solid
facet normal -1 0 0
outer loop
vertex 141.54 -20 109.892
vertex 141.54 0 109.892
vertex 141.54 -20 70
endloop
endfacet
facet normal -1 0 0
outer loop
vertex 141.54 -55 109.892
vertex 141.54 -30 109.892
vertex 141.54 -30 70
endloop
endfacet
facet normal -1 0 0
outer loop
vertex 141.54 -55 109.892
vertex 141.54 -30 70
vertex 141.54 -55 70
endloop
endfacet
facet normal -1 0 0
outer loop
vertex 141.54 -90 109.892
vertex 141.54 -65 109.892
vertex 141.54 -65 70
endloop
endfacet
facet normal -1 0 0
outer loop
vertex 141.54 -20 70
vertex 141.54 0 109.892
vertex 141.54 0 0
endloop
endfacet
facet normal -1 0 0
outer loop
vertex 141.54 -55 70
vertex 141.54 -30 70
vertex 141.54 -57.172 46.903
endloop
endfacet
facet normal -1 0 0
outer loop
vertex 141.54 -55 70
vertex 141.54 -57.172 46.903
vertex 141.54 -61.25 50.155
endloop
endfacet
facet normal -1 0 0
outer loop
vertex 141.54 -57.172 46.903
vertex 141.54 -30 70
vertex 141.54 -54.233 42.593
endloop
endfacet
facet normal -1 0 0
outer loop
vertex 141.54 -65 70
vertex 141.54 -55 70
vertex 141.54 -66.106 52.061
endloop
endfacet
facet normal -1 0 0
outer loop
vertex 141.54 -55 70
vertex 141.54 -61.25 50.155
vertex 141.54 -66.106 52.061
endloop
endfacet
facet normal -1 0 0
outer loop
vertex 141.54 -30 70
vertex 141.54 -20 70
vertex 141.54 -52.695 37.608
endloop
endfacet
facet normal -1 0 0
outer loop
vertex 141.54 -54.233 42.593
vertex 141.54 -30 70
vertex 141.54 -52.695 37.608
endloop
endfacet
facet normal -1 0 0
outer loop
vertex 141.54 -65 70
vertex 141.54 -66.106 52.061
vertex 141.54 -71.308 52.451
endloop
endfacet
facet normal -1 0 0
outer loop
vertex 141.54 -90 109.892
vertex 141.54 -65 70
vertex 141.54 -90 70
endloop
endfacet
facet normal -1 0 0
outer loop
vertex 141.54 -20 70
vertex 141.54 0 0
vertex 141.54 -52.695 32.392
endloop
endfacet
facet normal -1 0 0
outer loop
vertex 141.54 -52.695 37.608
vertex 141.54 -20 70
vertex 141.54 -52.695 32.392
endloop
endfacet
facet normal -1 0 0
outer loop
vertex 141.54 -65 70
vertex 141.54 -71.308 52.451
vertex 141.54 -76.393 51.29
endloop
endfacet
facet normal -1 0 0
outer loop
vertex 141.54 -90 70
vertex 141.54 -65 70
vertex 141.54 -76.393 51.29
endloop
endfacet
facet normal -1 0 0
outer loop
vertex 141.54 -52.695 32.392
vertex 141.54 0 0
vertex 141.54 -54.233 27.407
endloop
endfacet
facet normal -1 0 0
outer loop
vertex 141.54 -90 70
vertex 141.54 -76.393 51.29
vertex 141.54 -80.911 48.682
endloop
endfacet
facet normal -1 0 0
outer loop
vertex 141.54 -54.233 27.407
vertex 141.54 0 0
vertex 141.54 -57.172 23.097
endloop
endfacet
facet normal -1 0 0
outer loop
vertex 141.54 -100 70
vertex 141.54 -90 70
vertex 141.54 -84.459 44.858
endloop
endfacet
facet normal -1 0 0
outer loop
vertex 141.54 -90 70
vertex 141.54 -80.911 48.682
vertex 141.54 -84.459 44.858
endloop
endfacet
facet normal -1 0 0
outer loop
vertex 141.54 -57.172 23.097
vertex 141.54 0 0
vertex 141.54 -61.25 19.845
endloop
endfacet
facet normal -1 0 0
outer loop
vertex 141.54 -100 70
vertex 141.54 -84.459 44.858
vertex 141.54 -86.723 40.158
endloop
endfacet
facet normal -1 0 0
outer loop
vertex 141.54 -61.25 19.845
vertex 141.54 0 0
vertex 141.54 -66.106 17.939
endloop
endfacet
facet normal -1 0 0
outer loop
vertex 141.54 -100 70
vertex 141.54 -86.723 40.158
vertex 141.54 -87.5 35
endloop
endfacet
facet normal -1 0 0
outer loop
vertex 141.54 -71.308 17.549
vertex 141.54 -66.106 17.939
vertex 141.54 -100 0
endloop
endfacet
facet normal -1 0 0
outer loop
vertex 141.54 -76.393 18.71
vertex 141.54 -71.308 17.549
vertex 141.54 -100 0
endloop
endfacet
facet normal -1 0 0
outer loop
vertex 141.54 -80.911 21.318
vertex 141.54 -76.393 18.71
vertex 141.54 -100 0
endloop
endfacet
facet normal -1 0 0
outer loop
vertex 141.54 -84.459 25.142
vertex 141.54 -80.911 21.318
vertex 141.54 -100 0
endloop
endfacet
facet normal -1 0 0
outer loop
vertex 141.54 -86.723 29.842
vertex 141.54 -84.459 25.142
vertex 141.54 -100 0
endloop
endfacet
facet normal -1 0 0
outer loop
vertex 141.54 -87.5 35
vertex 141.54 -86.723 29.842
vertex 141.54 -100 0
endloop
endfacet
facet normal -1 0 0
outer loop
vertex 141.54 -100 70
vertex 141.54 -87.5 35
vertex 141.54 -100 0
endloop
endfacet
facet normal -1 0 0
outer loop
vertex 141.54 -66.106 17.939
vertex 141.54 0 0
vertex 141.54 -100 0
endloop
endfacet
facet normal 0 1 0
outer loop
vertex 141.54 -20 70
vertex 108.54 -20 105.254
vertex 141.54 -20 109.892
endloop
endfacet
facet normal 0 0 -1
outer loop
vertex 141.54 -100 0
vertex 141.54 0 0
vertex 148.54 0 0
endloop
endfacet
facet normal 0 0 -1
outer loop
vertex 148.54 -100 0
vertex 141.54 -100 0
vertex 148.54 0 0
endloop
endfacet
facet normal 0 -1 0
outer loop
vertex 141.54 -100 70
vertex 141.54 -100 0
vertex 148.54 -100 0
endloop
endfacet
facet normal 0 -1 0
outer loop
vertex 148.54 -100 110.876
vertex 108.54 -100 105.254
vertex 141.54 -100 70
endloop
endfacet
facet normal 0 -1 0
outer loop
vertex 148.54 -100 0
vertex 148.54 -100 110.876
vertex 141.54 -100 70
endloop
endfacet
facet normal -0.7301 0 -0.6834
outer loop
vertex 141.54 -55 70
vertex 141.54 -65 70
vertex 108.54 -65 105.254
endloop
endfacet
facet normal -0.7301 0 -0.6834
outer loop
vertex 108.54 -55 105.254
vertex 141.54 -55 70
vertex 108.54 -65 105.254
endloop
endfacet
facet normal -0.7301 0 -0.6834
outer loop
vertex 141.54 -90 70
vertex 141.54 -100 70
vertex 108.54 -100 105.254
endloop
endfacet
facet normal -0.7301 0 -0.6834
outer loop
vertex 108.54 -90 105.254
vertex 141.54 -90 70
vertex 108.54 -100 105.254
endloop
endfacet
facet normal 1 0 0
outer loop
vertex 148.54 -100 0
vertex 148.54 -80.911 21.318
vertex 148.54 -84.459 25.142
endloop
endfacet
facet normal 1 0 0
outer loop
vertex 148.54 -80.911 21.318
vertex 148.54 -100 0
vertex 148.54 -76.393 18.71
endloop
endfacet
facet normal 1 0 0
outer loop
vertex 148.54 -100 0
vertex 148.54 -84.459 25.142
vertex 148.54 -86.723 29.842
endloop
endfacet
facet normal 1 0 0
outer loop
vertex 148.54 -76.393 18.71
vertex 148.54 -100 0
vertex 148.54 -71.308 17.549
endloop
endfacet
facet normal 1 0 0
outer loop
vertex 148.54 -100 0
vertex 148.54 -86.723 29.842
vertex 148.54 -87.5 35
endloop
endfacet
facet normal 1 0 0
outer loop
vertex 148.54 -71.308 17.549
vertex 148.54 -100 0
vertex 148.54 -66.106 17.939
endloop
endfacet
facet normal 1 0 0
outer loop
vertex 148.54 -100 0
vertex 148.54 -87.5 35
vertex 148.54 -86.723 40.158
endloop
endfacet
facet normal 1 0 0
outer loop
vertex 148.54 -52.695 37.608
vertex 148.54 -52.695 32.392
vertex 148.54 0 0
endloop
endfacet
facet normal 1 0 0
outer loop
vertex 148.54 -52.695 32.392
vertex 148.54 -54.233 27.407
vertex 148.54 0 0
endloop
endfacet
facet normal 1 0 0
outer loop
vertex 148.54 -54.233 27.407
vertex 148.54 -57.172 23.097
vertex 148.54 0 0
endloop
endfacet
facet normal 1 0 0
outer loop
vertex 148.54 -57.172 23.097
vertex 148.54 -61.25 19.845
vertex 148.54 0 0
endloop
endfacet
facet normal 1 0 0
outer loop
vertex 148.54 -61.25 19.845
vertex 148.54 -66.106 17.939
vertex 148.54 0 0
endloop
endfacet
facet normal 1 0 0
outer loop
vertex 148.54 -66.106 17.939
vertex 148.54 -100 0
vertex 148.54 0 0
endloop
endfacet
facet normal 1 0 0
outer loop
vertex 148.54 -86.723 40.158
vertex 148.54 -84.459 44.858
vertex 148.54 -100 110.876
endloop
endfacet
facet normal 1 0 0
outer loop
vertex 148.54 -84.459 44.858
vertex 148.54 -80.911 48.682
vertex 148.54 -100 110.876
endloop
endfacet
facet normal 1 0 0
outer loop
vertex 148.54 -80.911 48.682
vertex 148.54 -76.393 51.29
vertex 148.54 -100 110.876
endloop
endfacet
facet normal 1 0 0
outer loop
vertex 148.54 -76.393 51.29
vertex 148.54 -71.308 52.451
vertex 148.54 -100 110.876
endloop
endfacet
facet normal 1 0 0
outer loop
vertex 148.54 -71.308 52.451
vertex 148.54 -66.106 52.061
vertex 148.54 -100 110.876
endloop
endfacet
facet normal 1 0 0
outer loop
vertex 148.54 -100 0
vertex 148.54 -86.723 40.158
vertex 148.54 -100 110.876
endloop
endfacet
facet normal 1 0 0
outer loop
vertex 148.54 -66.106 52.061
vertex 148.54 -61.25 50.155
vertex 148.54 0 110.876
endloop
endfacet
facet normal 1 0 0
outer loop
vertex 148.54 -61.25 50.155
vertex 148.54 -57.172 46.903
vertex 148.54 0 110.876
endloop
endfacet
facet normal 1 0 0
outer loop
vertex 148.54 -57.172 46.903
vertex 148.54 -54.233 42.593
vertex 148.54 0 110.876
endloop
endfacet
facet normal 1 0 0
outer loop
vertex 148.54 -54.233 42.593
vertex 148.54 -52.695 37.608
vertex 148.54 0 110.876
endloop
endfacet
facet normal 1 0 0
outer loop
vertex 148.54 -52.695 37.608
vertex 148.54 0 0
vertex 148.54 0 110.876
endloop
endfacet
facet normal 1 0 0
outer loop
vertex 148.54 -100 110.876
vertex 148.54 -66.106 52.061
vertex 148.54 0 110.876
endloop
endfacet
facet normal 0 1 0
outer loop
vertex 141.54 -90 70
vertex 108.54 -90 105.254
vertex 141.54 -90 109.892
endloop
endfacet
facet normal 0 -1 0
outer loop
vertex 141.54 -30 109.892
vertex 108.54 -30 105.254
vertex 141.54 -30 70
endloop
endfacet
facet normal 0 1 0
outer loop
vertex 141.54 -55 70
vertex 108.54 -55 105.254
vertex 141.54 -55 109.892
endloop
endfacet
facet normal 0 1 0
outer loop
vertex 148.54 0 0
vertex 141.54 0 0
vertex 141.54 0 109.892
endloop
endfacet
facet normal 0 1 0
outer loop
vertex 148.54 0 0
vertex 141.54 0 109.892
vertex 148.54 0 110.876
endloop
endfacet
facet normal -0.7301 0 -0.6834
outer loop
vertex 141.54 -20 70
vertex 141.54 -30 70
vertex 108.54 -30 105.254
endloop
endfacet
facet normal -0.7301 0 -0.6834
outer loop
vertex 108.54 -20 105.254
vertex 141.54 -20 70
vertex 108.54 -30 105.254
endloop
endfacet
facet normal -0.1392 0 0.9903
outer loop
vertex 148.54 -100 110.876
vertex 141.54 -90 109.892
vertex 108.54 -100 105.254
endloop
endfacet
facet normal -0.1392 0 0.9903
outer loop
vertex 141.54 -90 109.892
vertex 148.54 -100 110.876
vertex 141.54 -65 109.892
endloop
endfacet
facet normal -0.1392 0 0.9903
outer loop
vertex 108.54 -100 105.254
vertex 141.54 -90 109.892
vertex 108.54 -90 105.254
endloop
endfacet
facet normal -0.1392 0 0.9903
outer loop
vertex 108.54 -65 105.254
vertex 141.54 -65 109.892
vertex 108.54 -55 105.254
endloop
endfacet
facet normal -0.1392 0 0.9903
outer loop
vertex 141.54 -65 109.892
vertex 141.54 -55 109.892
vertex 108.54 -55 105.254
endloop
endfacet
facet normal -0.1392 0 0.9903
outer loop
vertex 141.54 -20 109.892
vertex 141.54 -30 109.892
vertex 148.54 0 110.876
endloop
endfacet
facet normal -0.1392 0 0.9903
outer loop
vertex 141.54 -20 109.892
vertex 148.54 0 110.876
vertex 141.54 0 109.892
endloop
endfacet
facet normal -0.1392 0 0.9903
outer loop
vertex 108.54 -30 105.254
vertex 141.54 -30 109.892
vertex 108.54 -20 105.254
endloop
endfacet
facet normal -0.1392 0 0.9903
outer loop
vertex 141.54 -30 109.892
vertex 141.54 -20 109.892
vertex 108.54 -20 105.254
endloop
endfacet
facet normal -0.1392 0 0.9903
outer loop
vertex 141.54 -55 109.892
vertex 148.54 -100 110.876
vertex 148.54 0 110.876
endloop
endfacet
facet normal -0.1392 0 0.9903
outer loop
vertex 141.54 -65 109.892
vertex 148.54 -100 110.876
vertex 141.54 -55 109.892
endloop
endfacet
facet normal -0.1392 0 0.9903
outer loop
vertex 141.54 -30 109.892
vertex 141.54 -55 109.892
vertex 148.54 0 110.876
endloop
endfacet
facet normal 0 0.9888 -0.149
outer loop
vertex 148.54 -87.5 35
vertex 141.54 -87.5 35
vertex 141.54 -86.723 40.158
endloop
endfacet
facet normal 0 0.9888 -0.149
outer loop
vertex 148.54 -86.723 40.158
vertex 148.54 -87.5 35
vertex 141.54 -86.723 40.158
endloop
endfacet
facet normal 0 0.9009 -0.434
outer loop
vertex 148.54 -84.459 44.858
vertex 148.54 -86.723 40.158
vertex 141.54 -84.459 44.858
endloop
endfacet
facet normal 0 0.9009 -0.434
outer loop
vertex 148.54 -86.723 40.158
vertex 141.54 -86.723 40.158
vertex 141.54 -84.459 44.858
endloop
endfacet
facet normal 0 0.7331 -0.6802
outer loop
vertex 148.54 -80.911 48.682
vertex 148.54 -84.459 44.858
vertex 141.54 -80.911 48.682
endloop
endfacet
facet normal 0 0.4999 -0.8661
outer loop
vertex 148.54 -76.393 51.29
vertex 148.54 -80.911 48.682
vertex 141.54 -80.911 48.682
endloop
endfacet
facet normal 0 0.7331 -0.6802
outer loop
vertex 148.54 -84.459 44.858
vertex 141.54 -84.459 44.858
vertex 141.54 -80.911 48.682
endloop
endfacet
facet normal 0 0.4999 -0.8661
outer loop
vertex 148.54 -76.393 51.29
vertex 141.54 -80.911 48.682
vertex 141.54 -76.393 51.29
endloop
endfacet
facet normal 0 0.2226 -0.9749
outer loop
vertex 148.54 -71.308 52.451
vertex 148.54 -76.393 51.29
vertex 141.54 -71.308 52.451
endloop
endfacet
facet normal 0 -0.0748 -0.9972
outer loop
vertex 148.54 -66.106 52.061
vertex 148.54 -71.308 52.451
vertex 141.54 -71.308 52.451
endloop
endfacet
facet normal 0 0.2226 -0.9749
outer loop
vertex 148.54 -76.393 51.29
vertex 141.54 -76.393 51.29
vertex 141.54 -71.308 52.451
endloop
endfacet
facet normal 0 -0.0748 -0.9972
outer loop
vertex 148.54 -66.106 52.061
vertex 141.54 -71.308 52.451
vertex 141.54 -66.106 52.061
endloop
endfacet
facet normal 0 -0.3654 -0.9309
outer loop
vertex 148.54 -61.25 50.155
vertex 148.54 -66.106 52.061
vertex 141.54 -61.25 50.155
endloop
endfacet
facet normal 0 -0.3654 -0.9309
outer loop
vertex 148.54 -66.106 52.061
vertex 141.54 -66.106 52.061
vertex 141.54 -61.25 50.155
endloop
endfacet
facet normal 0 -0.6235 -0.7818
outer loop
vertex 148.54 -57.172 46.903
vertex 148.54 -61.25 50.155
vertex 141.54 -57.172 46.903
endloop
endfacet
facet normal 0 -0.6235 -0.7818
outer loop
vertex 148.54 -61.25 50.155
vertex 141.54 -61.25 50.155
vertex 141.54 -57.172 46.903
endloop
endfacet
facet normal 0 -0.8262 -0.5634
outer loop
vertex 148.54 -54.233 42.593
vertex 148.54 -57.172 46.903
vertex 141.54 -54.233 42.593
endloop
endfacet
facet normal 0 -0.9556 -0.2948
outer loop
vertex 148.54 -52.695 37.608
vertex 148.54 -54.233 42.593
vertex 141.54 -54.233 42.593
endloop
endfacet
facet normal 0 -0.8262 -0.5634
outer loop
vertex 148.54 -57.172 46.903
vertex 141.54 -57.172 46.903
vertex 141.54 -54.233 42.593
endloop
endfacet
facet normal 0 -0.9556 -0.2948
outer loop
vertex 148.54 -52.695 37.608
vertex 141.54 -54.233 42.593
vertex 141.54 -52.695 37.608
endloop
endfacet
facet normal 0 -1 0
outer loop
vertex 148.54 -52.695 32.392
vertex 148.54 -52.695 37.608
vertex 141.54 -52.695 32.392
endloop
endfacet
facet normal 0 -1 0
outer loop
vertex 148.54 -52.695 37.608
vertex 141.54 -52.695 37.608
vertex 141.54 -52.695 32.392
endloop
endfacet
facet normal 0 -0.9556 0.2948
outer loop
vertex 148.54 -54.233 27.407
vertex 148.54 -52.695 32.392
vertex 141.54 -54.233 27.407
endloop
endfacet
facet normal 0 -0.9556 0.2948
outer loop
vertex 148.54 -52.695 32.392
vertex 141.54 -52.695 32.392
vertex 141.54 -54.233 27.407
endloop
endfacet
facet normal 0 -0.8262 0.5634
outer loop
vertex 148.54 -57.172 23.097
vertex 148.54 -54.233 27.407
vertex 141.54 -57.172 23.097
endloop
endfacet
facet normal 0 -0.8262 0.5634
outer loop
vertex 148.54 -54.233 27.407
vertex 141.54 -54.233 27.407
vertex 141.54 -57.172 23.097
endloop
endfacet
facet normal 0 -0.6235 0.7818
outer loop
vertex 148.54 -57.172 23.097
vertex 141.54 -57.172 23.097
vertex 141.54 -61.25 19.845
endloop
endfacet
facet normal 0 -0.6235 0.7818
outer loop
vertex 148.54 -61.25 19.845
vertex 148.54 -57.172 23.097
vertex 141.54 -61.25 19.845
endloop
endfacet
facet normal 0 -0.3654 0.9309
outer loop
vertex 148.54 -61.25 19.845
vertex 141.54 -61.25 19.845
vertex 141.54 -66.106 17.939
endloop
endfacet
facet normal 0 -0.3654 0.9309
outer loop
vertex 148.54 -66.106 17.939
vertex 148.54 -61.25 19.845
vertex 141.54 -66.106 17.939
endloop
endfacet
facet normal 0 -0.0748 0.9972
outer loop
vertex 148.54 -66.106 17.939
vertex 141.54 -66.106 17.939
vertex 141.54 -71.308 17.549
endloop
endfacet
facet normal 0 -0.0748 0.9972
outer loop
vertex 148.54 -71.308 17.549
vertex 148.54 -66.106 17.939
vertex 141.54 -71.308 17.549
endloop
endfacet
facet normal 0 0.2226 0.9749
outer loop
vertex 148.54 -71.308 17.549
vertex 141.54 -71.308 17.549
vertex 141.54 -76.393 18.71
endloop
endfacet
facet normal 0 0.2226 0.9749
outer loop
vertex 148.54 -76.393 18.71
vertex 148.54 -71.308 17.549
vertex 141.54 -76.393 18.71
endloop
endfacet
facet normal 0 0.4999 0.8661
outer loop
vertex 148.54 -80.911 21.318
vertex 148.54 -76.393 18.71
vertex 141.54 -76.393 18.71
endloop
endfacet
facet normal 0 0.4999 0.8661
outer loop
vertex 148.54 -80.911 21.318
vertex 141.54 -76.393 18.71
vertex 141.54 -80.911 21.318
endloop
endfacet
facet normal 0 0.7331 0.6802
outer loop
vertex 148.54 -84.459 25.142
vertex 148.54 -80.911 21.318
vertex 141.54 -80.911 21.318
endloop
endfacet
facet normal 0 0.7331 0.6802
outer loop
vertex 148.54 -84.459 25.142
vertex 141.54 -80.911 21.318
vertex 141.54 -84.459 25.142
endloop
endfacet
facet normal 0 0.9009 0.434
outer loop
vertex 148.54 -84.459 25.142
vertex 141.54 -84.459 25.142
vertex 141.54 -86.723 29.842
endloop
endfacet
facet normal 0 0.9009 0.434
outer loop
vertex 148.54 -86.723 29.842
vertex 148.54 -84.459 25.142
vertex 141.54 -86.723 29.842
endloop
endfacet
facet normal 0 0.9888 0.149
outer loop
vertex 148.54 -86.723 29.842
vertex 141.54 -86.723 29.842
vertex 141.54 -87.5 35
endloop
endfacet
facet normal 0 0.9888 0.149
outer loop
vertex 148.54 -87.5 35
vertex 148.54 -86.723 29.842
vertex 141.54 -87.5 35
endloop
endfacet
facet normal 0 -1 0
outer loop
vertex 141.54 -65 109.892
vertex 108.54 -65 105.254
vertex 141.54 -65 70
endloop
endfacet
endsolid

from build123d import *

# Parameters (mm, degrees)
F1_DEPTH = 100
F3_DEPTH = 100
F4_W     = 44.336
F4_H     = 25
F4_W_2   = 45.646268
F4_H_2   = 27.82878
F4_W_3   = 44.991
F5_DEPTH = 114
F7_DEPTH = 25


with BuildPart() as f1:
    # F0 (on Front) → F1 (new body)
    with BuildSketch(Plane.XZ):
        Polygon((0, 90), (0, 0), (148.54021, 0), (148.54021, 110.875965), align=None)
    extrude(amount=F1_DEPTH)

    # F2 (on face) → F3 (cut)
    with BuildSketch(Plane.XZ.offset(100)):
        Polygon((108.54021, 0), (141.54021, 0), (141.54021, 70), (108.54021, 105.254332), (0, 90), (0, 0), align=None)
    extrude(amount=-F3_DEPTH, mode=Mode.SUBTRACT)

    # F4 (on face) → F5 (cut)
    with BuildSketch(Plane(origin=(0, 0, 0), x_dir=(1, 0, 0), z_dir=(0, 0, -1))):
        with Locations((119.37221, 77.5)):
            Rectangle(F4_W, F4_H)
        with Locations((118.717076, 6.08561)):
            Rectangle(F4_W_2, F4_H_2)
        with Locations((119.04471, 42.5)):
            Rectangle(F4_W_3, F4_H)
    extrude(amount=-F5_DEPTH, mode=Mode.SUBTRACT)

    # F6 (on face) → F7 (cut)
    with BuildSketch(Plane(origin=(141.54021, 0, 0), x_dir=(0, -1, 0), z_dir=(-1, 0, 0))):
        with BuildLine():
            ThreePointArc((52.5, 35), (70, 17.5), (87.5, 35))
            Line((87.5, 35), (52.5, 35))
        make_face()
        with BuildLine():
            Line((52.5, 35), (87.5, 35))
            ThreePointArc((87.5, 35), (70, 52.5), (52.5, 35))
        make_face()
    extrude(amount=-F7_DEPTH, mode=Mode.SUBTRACT)


solid = f1.part
